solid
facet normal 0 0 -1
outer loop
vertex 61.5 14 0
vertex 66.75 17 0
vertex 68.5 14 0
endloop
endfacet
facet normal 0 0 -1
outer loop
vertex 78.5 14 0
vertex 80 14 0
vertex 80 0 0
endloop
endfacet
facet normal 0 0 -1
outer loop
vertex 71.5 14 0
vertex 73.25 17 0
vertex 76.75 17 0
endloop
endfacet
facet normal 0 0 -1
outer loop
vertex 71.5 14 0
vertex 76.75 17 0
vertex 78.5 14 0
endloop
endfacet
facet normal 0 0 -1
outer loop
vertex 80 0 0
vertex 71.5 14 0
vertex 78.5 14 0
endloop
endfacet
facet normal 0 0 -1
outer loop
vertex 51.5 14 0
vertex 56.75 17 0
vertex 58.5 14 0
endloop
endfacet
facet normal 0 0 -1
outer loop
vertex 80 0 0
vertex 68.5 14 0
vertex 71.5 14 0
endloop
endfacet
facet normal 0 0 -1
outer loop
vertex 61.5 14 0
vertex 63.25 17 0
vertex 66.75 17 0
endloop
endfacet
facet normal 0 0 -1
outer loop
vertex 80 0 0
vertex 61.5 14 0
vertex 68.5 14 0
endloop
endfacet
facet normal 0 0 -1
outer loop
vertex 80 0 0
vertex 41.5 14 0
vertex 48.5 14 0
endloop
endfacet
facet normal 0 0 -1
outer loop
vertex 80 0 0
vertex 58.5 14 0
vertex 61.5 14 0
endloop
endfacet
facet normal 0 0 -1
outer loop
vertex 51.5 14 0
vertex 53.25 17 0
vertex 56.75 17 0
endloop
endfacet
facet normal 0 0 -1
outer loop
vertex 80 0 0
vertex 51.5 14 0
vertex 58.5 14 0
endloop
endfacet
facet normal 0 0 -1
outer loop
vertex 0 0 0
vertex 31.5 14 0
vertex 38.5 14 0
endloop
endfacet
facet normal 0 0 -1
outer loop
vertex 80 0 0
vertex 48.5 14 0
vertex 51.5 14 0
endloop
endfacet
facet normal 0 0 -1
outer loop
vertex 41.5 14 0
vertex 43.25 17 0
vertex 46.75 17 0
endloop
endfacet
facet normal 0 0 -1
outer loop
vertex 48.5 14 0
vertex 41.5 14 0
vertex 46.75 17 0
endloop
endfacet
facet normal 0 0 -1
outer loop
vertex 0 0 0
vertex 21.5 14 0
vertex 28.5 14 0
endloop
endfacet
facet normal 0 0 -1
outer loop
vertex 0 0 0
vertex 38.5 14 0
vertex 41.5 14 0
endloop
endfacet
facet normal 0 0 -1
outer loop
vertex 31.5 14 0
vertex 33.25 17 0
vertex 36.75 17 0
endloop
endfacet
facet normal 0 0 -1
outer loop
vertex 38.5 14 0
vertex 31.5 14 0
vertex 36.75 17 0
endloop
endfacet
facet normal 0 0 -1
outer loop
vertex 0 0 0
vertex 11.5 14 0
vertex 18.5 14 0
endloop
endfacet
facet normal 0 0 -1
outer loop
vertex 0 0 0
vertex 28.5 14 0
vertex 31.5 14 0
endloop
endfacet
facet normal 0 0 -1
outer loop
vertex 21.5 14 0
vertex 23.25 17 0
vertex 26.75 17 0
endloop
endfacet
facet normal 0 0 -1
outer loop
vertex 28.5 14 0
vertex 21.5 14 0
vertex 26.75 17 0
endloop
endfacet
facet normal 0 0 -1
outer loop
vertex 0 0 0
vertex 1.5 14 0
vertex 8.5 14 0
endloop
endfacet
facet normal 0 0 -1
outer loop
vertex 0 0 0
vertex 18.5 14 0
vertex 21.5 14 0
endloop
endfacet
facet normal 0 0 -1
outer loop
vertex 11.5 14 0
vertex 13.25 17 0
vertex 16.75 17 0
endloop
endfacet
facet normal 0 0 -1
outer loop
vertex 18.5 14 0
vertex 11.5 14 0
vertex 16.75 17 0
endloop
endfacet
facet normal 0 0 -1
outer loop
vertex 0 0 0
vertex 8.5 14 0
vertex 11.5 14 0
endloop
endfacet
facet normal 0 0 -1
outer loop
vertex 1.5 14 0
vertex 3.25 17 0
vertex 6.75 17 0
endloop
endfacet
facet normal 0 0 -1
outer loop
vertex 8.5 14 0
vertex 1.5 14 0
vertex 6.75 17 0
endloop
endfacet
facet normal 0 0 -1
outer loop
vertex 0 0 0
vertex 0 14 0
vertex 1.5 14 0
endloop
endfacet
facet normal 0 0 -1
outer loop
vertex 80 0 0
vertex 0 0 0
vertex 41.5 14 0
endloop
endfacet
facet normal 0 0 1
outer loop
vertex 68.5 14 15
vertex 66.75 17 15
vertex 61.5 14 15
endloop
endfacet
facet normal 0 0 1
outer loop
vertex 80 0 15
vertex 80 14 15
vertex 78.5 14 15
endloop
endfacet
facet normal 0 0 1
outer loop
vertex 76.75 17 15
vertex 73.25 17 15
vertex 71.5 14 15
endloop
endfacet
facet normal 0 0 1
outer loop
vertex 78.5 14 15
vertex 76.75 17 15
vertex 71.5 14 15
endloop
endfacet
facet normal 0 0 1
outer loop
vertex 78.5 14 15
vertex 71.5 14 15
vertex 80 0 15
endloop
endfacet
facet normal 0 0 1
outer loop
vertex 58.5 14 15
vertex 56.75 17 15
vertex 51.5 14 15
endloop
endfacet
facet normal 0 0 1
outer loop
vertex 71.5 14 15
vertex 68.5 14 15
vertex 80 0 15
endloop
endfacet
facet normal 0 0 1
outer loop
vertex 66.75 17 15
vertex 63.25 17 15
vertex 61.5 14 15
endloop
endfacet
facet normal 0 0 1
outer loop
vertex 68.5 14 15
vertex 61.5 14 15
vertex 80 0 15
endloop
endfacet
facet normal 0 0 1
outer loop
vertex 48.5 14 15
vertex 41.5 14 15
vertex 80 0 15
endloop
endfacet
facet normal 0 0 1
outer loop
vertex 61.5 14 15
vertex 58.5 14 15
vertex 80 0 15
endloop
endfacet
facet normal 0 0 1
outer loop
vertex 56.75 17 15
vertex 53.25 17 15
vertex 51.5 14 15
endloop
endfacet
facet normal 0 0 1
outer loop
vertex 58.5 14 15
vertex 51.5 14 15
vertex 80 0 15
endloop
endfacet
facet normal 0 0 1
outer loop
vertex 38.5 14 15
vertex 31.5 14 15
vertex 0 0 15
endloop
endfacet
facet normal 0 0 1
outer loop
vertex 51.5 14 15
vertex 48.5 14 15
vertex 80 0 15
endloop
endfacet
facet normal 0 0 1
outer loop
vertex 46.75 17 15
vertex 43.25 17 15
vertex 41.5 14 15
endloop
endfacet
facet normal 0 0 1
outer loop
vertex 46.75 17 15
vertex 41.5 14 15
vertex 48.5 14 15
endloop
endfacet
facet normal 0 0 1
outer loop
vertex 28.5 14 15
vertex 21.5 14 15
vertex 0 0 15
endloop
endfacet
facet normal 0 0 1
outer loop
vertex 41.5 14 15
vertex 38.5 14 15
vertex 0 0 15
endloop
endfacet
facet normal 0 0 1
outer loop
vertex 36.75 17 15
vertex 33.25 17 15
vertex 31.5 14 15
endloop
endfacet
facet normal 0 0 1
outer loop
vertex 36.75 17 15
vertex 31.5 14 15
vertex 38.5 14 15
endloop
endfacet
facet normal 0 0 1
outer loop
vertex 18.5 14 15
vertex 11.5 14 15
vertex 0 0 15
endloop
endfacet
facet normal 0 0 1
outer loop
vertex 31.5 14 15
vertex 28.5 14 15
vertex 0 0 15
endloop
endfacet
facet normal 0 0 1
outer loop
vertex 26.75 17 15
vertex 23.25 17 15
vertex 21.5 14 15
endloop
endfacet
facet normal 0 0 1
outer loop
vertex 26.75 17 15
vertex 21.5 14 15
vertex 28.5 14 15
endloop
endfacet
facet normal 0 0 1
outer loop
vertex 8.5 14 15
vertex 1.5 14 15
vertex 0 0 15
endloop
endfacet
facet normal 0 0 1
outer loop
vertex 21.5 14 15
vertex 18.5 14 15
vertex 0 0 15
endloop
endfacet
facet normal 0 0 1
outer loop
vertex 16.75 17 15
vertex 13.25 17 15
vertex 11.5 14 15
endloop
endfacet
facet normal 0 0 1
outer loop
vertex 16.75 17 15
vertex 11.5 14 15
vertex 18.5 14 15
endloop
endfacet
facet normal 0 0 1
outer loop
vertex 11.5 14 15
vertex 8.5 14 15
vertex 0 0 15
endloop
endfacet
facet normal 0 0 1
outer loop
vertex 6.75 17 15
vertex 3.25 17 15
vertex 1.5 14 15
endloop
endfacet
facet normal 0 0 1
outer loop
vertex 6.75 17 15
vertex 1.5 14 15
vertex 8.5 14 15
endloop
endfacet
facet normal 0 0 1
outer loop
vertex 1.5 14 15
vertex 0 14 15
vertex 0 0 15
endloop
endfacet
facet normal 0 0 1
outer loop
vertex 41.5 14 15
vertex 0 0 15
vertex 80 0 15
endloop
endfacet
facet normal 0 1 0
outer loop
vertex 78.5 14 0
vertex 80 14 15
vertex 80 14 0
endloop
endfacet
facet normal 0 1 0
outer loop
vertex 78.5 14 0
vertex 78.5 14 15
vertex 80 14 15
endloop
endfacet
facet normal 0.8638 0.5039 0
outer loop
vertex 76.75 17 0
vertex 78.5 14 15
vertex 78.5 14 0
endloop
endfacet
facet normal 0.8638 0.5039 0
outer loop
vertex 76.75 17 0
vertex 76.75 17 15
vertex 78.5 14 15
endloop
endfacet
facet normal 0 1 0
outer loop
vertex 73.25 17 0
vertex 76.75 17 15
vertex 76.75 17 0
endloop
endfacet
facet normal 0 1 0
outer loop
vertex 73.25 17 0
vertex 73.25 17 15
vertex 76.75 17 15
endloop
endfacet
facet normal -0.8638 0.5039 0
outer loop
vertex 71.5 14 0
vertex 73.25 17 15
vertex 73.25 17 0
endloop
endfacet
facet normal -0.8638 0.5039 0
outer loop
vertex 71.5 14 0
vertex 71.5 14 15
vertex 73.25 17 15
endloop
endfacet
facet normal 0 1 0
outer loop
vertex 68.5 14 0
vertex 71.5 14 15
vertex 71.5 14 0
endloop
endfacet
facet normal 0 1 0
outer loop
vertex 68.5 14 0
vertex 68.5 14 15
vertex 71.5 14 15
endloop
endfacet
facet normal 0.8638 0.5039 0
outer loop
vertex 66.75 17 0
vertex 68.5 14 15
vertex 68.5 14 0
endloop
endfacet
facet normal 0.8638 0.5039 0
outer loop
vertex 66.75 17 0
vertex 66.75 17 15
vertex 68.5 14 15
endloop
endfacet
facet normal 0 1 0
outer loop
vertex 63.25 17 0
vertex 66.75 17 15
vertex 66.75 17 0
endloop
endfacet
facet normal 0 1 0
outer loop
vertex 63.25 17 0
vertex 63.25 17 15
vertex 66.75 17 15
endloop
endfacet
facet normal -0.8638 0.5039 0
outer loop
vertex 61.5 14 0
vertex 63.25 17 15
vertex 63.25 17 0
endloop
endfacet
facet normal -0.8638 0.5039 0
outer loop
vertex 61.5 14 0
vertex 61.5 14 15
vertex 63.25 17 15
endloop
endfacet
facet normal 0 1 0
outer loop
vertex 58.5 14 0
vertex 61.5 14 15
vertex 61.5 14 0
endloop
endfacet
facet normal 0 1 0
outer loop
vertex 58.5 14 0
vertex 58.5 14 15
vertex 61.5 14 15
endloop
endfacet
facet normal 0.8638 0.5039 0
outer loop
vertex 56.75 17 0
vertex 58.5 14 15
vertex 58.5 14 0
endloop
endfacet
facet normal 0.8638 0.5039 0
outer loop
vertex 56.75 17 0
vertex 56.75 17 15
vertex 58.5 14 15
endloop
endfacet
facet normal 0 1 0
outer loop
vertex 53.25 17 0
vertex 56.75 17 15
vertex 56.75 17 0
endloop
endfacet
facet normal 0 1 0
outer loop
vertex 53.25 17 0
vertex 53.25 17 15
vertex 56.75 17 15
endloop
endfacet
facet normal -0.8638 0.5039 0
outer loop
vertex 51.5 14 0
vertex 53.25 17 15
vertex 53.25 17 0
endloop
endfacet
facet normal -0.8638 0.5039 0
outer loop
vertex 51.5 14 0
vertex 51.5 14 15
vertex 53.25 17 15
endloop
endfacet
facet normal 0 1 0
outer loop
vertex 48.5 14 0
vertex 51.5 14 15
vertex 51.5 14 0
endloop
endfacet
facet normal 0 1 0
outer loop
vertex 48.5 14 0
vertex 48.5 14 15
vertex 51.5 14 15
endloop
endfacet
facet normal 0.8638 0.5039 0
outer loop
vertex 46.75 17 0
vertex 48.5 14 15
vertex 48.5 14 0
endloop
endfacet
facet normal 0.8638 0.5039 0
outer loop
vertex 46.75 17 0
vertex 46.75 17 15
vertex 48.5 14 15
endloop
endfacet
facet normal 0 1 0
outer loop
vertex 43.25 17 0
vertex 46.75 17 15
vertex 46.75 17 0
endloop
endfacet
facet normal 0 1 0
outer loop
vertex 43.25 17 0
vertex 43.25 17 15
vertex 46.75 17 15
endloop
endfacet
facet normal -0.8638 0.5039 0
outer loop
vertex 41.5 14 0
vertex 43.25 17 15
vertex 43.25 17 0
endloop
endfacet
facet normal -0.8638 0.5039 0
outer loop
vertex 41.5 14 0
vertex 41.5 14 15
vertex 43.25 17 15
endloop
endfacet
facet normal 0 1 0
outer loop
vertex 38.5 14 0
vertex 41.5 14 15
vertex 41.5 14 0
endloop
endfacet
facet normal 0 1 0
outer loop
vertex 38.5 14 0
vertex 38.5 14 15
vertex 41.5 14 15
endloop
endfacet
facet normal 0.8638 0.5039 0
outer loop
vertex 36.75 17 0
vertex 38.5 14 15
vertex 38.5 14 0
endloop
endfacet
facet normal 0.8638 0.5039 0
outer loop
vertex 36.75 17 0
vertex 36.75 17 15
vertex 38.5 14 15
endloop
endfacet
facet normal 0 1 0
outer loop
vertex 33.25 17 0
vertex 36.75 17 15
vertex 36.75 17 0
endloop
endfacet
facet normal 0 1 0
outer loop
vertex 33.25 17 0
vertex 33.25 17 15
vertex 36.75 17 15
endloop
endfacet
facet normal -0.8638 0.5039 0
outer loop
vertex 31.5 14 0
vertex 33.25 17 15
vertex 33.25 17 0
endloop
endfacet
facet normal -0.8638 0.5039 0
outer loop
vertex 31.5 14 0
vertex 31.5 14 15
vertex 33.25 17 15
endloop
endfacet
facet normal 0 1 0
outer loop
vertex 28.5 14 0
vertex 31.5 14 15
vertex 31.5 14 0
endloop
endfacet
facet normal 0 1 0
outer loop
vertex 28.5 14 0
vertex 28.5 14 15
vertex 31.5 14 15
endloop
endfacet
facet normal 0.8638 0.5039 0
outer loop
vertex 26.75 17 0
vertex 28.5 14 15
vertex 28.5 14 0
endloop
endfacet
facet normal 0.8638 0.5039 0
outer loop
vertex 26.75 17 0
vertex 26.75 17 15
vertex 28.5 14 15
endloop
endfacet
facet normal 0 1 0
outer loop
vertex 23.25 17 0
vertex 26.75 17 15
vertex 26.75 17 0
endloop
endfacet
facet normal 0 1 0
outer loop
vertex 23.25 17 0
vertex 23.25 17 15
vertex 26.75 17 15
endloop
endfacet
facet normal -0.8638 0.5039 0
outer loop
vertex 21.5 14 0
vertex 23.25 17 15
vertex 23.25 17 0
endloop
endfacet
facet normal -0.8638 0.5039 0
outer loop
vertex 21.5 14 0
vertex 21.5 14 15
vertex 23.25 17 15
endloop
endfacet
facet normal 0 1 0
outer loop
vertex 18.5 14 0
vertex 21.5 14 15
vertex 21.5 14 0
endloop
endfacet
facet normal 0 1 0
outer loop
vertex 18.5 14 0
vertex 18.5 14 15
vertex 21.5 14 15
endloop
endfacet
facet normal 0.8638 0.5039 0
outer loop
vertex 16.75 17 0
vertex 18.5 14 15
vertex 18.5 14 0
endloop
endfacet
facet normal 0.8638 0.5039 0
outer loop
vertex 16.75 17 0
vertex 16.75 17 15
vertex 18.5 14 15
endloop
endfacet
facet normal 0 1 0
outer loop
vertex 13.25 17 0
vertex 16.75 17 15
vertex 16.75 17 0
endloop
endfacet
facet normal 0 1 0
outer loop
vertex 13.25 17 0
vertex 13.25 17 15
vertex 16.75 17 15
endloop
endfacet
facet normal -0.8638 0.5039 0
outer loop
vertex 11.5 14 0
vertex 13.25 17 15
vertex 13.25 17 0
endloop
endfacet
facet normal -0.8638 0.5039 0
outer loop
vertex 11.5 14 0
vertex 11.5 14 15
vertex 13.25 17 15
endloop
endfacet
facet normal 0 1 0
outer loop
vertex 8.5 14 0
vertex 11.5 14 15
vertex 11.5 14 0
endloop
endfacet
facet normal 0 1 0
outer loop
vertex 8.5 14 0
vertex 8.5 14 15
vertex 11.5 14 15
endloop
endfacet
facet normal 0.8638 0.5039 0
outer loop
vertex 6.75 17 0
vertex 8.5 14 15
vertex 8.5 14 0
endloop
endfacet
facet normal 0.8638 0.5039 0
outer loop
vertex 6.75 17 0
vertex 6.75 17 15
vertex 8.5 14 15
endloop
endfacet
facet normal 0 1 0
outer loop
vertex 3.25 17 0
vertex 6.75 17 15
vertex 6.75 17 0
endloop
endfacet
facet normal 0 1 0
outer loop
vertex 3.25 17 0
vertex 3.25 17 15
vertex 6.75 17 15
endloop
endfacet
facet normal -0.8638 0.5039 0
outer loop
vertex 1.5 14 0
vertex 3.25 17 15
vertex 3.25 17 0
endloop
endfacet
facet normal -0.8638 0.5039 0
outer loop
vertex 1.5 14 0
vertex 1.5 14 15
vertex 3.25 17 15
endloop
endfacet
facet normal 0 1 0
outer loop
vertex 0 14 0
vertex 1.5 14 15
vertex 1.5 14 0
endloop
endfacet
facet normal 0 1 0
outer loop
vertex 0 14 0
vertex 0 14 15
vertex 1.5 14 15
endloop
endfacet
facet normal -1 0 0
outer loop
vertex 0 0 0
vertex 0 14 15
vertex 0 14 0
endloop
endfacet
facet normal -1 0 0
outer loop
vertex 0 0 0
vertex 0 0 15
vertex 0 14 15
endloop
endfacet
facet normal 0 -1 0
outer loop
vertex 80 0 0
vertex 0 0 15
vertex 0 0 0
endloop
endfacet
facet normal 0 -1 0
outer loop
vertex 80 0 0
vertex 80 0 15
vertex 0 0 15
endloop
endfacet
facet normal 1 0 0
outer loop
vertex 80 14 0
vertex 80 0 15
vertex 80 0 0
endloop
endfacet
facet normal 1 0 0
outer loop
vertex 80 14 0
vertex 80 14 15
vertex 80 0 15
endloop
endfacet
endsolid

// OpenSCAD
$fn = 32;

// ----------------------------------------------------------------------
// Gear rack: 8 teeth, pitch 10 mm
// ----------------------------------------------------------------------

// --- parameters (mm) ---
teeth = 8;                // number of teeth
pitch = 10;               // tooth pitch, X
root_w = 7;               // tooth width at the root
tip_w = 3.5;              // tooth width at the tip
base_h = 14;              // rack body height, Y
tooth_h = 3;              // tooth height above the body
plate_t = 15;             // rack width, Z (extrusion height)

rack_l = teeth * pitch;  // overall length
total_h = base_h + tooth_h;  // overall height

profile = [[0, 0], [80, 0], [80, 14], [78.5, 14], [76.75, 17], [73.25, 17], [71.5, 14], [68.5, 14], [66.75, 17], [63.25, 17], [61.5, 14], [58.5, 14], [56.75, 17], [53.25, 17], [51.5, 14], [48.5, 14], [46.75, 17], [43.25, 17], [41.5, 14], [38.5, 14], [36.75, 17], [33.25, 17], [31.5, 14], [28.5, 14], [26.75, 17], [23.25, 17], [21.5, 14], [18.5, 14], [16.75, 17], [13.25, 17], [11.5, 14], [8.5, 14], [6.75, 17], [3.25, 17], [1.5, 14], [0, 14]];  // primary outline, 36 points, counter clockwise

// --- the one profile operation ---
linear_extrude(height = plate_t) polygon(points = profile);
